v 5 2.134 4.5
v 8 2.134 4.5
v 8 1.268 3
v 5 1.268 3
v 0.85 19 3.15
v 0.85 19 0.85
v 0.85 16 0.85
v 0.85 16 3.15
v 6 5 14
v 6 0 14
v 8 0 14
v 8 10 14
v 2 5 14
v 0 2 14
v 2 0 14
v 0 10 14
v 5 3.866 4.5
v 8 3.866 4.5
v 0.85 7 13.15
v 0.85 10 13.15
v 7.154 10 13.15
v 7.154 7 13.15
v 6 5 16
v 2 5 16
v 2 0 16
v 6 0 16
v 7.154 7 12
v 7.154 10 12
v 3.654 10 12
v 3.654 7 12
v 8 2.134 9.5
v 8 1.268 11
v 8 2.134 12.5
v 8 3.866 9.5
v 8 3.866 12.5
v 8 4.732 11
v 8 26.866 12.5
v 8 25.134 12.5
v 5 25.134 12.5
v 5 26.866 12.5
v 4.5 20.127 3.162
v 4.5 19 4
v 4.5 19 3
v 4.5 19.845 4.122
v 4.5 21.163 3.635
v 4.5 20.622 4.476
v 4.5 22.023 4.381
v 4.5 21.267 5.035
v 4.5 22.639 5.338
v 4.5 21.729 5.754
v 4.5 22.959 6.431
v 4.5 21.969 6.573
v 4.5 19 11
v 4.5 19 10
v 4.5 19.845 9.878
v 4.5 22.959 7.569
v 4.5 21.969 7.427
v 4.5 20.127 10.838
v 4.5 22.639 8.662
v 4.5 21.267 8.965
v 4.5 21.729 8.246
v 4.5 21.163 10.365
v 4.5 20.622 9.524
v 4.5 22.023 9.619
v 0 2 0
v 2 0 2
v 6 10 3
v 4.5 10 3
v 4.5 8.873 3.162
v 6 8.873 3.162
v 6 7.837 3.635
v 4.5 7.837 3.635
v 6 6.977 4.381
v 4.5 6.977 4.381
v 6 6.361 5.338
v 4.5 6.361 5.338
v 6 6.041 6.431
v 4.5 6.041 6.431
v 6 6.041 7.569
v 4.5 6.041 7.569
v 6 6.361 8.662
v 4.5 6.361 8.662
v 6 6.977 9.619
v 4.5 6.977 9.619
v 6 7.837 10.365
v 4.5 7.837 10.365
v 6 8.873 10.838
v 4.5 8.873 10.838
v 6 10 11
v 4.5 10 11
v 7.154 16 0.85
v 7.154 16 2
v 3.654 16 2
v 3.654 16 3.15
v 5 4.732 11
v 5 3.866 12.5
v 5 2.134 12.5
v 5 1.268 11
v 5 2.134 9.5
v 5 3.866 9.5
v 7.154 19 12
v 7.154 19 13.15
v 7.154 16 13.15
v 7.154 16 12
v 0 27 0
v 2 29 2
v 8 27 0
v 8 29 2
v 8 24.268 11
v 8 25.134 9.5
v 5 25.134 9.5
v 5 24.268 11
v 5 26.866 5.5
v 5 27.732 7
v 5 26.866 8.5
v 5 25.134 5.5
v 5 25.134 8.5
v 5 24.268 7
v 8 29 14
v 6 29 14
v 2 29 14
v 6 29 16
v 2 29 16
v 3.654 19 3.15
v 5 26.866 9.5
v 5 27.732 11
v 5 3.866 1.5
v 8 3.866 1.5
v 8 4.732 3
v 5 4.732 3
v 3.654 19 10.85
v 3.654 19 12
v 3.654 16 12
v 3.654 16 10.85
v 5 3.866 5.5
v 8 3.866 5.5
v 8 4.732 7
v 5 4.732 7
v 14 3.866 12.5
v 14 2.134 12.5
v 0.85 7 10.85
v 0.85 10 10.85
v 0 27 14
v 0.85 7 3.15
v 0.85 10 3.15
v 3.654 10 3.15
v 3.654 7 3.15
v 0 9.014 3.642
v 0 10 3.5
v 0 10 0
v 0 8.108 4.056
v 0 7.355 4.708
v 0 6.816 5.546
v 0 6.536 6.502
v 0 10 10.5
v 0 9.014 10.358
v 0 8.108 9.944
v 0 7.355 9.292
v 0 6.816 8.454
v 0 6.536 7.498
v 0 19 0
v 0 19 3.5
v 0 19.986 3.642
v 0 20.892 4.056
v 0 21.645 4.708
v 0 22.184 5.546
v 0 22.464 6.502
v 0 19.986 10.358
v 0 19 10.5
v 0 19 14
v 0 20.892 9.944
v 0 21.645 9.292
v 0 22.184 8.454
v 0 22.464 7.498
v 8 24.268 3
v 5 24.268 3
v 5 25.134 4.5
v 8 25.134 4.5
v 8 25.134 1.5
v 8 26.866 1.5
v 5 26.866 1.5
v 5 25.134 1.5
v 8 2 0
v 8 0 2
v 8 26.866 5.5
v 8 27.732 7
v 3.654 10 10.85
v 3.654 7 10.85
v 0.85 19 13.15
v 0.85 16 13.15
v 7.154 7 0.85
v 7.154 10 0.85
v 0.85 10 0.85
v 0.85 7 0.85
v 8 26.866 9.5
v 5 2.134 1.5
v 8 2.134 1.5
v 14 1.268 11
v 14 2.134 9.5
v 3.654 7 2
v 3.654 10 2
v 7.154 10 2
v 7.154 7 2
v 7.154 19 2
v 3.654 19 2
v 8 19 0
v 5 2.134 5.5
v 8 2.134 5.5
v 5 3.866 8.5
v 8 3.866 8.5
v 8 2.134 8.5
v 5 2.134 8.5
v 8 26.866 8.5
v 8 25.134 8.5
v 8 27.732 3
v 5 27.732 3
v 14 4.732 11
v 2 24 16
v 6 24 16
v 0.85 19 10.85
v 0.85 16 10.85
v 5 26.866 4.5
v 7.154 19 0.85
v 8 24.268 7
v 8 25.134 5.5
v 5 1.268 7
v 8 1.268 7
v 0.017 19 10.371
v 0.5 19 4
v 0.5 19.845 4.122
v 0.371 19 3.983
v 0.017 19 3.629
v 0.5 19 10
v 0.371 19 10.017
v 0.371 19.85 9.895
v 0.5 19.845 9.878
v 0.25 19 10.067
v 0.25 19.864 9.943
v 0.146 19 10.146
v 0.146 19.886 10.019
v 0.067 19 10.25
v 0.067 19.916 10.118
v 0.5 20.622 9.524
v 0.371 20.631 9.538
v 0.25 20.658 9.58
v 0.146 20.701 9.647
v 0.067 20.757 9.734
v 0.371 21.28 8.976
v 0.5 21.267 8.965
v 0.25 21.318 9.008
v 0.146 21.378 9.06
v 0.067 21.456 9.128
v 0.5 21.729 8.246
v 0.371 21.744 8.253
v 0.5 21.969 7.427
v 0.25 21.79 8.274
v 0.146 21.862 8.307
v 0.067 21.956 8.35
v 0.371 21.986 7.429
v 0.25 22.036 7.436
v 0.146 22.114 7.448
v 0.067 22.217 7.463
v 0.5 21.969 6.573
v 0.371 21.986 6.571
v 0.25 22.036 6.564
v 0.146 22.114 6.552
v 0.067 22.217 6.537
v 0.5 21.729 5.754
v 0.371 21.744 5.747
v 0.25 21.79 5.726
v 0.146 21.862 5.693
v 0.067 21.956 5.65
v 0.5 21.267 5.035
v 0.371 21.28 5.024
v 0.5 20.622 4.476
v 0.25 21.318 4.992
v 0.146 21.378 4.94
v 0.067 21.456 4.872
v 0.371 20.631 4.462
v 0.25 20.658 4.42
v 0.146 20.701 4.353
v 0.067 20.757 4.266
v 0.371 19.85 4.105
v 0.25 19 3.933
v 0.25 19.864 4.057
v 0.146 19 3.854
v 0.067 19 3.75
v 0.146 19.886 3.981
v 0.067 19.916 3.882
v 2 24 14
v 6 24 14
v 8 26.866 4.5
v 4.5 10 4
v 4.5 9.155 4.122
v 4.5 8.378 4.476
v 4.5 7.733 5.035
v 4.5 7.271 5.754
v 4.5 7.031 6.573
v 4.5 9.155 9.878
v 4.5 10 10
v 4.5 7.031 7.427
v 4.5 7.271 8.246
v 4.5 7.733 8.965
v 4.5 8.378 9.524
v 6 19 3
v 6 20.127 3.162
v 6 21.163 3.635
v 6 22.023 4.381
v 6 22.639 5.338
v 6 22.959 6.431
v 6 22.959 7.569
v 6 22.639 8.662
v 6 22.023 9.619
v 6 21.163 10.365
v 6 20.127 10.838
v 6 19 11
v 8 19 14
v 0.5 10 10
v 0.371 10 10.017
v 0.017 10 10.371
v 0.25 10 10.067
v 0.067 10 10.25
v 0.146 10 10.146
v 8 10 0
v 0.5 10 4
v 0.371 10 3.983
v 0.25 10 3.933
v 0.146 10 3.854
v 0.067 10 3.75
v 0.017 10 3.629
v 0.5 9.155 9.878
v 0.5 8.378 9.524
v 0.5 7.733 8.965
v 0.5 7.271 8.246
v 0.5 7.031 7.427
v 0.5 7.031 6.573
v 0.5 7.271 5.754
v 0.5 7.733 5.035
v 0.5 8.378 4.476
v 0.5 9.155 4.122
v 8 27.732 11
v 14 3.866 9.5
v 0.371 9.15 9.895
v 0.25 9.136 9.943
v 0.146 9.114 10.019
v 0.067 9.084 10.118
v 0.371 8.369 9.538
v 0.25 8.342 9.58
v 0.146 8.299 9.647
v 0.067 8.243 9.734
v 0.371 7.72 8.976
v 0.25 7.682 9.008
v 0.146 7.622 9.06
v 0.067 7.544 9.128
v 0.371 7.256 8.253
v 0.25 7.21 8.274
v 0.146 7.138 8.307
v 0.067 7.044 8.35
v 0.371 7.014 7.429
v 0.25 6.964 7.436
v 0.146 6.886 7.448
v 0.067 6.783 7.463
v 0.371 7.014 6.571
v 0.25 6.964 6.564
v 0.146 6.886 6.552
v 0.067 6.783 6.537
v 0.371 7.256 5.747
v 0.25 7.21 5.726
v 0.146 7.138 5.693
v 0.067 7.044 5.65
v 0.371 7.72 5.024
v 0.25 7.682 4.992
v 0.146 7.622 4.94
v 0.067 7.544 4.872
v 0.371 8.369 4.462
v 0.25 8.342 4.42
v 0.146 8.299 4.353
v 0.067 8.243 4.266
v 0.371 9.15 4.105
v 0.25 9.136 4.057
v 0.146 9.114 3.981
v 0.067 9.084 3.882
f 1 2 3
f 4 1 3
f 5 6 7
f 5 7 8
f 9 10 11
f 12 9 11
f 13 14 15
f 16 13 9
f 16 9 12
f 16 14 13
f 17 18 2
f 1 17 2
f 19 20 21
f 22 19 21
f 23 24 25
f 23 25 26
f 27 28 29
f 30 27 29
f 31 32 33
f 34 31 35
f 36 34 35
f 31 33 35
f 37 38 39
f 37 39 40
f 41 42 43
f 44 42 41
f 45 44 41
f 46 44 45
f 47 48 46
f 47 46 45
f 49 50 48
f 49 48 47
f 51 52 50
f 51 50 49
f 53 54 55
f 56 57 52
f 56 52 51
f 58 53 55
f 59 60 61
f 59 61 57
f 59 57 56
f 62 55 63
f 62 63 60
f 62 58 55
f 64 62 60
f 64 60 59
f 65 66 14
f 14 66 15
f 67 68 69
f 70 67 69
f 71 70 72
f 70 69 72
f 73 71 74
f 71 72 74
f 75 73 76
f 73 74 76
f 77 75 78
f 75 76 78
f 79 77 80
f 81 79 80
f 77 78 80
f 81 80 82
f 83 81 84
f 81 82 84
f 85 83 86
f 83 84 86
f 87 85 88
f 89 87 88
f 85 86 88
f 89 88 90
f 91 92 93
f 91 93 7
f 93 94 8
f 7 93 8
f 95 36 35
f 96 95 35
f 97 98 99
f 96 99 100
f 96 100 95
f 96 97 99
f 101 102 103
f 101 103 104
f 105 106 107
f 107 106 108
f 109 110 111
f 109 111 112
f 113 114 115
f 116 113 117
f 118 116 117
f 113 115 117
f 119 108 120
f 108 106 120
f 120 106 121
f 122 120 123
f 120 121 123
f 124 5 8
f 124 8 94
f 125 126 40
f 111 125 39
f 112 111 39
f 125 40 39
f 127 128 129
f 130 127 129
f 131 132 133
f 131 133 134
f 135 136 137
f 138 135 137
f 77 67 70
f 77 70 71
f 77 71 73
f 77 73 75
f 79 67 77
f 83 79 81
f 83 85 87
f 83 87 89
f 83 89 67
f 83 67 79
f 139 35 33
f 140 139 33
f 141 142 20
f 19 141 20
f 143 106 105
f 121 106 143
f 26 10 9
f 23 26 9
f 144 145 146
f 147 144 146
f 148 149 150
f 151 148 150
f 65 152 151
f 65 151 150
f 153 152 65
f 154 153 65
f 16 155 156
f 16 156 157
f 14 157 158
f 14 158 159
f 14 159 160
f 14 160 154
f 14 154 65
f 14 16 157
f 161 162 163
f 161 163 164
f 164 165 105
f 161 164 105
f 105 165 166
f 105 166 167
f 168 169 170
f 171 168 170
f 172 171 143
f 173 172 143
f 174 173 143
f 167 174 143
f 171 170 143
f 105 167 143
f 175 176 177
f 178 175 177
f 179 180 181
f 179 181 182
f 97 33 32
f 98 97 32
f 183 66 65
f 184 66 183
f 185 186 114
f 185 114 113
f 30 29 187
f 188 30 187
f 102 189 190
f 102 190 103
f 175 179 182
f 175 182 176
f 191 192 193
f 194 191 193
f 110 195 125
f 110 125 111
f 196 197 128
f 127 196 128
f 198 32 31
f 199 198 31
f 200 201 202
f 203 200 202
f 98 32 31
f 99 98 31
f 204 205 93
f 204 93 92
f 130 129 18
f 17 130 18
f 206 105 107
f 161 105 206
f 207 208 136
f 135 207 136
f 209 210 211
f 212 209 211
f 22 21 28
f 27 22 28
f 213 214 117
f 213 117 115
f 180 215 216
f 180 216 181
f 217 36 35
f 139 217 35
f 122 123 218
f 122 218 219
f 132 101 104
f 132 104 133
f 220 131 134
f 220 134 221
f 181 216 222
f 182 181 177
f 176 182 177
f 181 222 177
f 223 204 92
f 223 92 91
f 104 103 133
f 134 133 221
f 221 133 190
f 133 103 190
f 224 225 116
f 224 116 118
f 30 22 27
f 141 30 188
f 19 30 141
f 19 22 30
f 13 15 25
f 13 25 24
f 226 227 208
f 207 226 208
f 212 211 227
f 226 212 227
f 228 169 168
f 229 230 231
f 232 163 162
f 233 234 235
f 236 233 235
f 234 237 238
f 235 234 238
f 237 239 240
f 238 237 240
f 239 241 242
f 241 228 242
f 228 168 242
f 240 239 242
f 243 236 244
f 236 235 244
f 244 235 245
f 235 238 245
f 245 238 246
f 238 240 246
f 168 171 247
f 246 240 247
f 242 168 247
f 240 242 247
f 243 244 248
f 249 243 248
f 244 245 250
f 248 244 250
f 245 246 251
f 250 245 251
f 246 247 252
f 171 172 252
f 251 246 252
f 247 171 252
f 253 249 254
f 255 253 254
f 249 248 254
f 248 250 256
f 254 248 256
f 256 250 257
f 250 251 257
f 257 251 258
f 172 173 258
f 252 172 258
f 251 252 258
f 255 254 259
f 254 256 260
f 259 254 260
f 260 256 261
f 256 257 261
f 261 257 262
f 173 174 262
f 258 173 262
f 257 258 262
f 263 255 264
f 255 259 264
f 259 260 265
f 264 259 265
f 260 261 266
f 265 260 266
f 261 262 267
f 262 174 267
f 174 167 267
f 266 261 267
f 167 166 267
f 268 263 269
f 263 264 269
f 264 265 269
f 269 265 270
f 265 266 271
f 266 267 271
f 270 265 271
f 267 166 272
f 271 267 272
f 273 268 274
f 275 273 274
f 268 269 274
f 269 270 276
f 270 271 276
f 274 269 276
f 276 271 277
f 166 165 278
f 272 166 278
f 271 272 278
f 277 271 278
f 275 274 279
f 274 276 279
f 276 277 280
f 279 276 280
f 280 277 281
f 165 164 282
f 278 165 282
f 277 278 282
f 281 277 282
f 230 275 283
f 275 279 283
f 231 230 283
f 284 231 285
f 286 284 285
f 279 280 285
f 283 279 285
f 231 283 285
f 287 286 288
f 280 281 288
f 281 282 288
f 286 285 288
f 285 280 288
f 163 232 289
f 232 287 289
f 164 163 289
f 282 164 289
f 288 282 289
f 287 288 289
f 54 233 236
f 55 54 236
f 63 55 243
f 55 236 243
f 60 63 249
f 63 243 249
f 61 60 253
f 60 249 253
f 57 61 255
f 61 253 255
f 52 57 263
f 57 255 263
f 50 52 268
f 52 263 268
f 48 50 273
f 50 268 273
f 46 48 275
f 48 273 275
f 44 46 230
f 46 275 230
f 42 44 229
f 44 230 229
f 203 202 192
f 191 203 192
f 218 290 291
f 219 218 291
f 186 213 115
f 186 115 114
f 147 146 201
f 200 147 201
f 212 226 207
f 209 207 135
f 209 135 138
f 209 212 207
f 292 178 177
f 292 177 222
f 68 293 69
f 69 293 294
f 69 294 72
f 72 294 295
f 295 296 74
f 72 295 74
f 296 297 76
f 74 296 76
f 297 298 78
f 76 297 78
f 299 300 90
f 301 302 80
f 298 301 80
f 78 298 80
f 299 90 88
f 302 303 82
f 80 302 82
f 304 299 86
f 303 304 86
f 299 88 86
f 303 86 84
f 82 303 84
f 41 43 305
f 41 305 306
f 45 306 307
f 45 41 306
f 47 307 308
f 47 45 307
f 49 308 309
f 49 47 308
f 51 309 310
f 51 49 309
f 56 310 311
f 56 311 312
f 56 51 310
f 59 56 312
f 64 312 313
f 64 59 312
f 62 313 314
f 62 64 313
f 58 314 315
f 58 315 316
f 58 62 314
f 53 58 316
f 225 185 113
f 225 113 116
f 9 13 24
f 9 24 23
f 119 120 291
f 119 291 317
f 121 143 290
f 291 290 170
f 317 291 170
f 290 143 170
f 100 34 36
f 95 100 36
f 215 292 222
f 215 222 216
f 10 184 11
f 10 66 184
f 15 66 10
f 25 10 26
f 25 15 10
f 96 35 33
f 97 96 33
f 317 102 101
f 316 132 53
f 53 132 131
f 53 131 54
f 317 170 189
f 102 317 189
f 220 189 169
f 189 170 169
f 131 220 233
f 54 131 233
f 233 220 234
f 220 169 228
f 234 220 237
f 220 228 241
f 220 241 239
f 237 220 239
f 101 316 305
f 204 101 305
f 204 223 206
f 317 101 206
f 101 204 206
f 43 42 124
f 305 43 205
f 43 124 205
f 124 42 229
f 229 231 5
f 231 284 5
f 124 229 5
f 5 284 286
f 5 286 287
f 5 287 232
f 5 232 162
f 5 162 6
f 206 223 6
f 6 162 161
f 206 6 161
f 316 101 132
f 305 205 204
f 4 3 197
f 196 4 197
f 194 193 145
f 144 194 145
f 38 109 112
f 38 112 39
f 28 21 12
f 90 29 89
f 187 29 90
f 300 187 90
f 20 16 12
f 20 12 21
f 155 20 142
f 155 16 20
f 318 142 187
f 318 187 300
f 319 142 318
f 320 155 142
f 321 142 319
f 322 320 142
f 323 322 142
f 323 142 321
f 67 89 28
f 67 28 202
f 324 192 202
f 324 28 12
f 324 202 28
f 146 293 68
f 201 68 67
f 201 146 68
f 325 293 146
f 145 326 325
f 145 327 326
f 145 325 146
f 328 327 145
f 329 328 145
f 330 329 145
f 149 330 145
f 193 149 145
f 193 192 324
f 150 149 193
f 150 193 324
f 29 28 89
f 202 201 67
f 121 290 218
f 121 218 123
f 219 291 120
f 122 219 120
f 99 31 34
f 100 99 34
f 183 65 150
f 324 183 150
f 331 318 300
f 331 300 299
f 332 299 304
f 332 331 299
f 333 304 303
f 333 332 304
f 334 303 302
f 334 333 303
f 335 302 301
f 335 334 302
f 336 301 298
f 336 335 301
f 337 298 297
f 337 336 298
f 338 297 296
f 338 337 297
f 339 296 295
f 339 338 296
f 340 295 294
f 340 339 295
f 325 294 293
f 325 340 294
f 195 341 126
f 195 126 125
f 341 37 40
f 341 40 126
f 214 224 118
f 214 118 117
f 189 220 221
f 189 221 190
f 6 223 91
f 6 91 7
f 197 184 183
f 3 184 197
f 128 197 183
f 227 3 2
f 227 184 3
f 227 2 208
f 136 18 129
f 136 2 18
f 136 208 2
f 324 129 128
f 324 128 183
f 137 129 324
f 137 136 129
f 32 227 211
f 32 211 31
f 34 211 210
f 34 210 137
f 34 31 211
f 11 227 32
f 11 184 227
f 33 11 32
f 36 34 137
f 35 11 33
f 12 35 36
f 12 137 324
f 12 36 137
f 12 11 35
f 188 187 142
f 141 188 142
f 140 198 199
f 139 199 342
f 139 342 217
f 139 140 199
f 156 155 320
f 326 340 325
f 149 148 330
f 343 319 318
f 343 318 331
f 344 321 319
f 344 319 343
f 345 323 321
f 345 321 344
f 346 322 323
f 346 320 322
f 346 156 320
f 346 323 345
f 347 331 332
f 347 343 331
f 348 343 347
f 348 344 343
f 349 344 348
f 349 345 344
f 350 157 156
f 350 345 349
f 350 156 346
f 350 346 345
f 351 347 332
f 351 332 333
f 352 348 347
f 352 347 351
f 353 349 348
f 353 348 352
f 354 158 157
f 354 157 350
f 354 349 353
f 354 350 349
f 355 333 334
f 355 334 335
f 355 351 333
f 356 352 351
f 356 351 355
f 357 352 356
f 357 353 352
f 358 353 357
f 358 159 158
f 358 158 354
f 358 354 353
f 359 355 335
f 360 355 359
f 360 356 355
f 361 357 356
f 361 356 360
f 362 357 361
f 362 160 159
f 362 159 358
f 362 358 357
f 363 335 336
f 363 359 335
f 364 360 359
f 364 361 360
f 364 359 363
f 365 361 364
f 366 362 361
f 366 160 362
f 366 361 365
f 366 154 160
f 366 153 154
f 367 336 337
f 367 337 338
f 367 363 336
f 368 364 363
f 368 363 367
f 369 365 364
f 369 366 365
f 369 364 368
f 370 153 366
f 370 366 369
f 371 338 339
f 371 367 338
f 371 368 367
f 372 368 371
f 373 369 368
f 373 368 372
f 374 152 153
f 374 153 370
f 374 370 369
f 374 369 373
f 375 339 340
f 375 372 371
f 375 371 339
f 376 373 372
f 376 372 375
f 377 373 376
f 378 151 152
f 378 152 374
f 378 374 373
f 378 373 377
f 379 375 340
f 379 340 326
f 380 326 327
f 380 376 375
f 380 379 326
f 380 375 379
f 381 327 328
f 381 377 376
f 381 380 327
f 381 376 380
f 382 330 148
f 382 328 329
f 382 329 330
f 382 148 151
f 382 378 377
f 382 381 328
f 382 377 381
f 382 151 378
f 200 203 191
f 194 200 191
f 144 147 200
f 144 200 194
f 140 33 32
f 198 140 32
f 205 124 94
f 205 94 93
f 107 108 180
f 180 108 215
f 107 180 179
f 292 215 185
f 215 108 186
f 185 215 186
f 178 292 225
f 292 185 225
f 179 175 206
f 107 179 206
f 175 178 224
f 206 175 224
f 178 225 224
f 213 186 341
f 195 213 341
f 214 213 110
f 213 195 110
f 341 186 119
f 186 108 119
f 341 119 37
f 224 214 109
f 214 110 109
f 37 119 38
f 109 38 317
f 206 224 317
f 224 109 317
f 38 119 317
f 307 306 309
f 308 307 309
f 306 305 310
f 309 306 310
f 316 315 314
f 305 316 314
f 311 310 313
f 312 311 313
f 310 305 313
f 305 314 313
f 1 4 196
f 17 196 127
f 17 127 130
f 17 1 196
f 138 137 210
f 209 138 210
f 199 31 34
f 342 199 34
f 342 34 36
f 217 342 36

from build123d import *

# Parameters (mm, degrees)
F0_W       = 10
F0_H       = 14
F1_DEPTH   = 8
F3_DEPTH   = 6
F4_DEPTH   = 4.5
F6_DEPTH   = 3
F7_R       = 0.5
F9_DEPTH   = 3
F10_DEPTH  = 6
F13_DEPTH  = 6
F14_W      = 4
F14_H      = 5
F15_DEPTH  = 2
F16_W      = 4
F16_H      = 5
F17_DEPTH  = 2
F18_SIZE   = 2
F18_2_SIZE = 2


with BuildPart() as f1:
    # F0 (on Right) → F1 (new body)
    with BuildSketch(Plane.YZ):
        with Locations((5, 7)):
            Rectangle(F0_W, F0_H)
    extrude(amount=F1_DEPTH)

    # F2 (on face) → F3 (cut)
    with BuildSketch(Plane(origin=(0, 0, 0), x_dir=(0, -1, 0), z_dir=(-1, 0, 0))):
        with BuildLine():
            Line((-10, 4), (-10, 3))
            ThreePointArc((-10, 3), (-6, 7), (-10, 11))
            Line((-10, 11), (-10, 10))
            ThreePointArc((-10, 10), (-7, 7), (-10, 4))
        make_face()
        with BuildLine():
            Line((-10, 10), (-10, 4))
            ThreePointArc((-10, 4), (-7, 7), (-10, 10))
        make_face()
    extrude(amount=-F3_DEPTH, mode=Mode.SUBTRACT)

    # F2 (on face) → F4 (join)
    with BuildSketch(Plane(origin=(0, 0, 0), x_dir=(0, -1, 0), z_dir=(-1, 0, 0))):
        with BuildLine():
            Line((-10, 4), (-10, 3))
            ThreePointArc((-10, 3), (-6, 7), (-10, 11))
            Line((-10, 11), (-10, 10))
            ThreePointArc((-10, 10), (-7, 7), (-10, 4))
        make_face()
    extrude(amount=-F4_DEPTH)

    # F5 (on face) → F6 (cut)
    with BuildSketch(Plane(origin=(0, 10, 0), x_dir=(-1, 0, 0), z_dir=(0, 1, 0))):
        Polygon((-0.8500000113, 10.8500000113), (-0.8500000113, 13.1499999887), (-3.6539883502, 13.1499999887), (-7.1539883502, 13.1499999887), (-7.1539883502, 12), (-3.6539883502, 12), (-3.6539883502, 10.8500000113), align=None)
        Polygon((-3.6539883502, 0.8500000113), (-0.8500000113, 0.8500000113), (-0.8500000113, 3.1499999887), (-3.6539883502, 3.1499999887), (-3.6539883502, 2), (-7.1539883502, 2), (-7.1539883502, 0.8500000113), align=None)
    extrude(amount=-F6_DEPTH, mode=Mode.SUBTRACT)

    # F7
    f7_edges = [f1.edges().sort_by_distance(p)[0] for p in [
        (0, 7, 7),
    ]]
    fillet(f7_edges, radius=F7_R)

    # F8 (on face) → F9 (cut)
    with BuildSketch(Plane.YZ.offset(8)):
        Polygon((2.1339745962, 9.5), (3.8660254038, 9.5), (4.7320508076, 11), (3.8660254038, 12.5), (2.1339745962, 12.5), (1.2679491924, 11), align=None)
        Polygon((4.7320508076, 3), (3.8660254038, 4.5), (2.1339745962, 4.5), (1.2679491924, 3), (2.1339745962, 1.5), (3.8660254038, 1.5), align=None)
        Polygon((2.1339745962, 5.5), (3.8660254038, 5.5), (4.7320508076, 7), (3.8660254038, 8.5), (2.1339745962, 8.5), (1.2679491924, 7), align=None)
    extrude(amount=-F9_DEPTH, mode=Mode.SUBTRACT)


with BuildPart() as f10:
    # F8 (on face) → F10 (new body)
    with BuildSketch(Plane.YZ.offset(8)):
        Polygon((2.1339745962, 9.5), (3.8660254038, 9.5), (4.7320508076, 11), (3.8660254038, 12.5), (2.1339745962, 12.5), (1.2679491924, 11), align=None)
    extrude(amount=F10_DEPTH)


with BuildPart() as f12_1:
    # F12: instance of F1
    add(f1.part.mirror(Plane.XZ.offset(-14.5)))

    # F13 (add): faces of the model
    f13_faces = [f12_1.faces().sort_by_distance(p)[0] for p in [
        (3.4632379051, 22, 12.2209601596),
        (3.4632379051, 22, 1.7790398404),
    ]]
    extrude(f13_faces, amount=F13_DEPTH)

    # F16 (on face) → F17 (join)
    with BuildSketch(Plane.XY.offset(14)):
        with Locations((4, 26.5)):
            Rectangle(F16_W, F16_H)
    extrude(amount=F17_DEPTH)

    # F18#2
    f18_2_edges = [f12_1.edges().sort_by_distance(p)[0] for p in [
        (4, 29, 0),
        (0, 29, 7),
    ]]
    chamfer(f18_2_edges, length=F18_2_SIZE)


with BuildPart() as f1_1:
    add(f1.part)

    # F14 (on face) → F15 (join)
    with BuildSketch(Plane.XY.offset(14)):
        with Locations((4, 2.5)):
            Rectangle(F14_W, F14_H)
    extrude(amount=F15_DEPTH)

    # F18
    f18_edges = [f1_1.edges().sort_by_distance(p)[0] for p in [
        (4, 0, 0),
        (0, 0, 7),
    ]]
    chamfer(f18_edges, length=F18_SIZE)


solid = Compound([f10.part, f12_1.part, f1_1.part])
